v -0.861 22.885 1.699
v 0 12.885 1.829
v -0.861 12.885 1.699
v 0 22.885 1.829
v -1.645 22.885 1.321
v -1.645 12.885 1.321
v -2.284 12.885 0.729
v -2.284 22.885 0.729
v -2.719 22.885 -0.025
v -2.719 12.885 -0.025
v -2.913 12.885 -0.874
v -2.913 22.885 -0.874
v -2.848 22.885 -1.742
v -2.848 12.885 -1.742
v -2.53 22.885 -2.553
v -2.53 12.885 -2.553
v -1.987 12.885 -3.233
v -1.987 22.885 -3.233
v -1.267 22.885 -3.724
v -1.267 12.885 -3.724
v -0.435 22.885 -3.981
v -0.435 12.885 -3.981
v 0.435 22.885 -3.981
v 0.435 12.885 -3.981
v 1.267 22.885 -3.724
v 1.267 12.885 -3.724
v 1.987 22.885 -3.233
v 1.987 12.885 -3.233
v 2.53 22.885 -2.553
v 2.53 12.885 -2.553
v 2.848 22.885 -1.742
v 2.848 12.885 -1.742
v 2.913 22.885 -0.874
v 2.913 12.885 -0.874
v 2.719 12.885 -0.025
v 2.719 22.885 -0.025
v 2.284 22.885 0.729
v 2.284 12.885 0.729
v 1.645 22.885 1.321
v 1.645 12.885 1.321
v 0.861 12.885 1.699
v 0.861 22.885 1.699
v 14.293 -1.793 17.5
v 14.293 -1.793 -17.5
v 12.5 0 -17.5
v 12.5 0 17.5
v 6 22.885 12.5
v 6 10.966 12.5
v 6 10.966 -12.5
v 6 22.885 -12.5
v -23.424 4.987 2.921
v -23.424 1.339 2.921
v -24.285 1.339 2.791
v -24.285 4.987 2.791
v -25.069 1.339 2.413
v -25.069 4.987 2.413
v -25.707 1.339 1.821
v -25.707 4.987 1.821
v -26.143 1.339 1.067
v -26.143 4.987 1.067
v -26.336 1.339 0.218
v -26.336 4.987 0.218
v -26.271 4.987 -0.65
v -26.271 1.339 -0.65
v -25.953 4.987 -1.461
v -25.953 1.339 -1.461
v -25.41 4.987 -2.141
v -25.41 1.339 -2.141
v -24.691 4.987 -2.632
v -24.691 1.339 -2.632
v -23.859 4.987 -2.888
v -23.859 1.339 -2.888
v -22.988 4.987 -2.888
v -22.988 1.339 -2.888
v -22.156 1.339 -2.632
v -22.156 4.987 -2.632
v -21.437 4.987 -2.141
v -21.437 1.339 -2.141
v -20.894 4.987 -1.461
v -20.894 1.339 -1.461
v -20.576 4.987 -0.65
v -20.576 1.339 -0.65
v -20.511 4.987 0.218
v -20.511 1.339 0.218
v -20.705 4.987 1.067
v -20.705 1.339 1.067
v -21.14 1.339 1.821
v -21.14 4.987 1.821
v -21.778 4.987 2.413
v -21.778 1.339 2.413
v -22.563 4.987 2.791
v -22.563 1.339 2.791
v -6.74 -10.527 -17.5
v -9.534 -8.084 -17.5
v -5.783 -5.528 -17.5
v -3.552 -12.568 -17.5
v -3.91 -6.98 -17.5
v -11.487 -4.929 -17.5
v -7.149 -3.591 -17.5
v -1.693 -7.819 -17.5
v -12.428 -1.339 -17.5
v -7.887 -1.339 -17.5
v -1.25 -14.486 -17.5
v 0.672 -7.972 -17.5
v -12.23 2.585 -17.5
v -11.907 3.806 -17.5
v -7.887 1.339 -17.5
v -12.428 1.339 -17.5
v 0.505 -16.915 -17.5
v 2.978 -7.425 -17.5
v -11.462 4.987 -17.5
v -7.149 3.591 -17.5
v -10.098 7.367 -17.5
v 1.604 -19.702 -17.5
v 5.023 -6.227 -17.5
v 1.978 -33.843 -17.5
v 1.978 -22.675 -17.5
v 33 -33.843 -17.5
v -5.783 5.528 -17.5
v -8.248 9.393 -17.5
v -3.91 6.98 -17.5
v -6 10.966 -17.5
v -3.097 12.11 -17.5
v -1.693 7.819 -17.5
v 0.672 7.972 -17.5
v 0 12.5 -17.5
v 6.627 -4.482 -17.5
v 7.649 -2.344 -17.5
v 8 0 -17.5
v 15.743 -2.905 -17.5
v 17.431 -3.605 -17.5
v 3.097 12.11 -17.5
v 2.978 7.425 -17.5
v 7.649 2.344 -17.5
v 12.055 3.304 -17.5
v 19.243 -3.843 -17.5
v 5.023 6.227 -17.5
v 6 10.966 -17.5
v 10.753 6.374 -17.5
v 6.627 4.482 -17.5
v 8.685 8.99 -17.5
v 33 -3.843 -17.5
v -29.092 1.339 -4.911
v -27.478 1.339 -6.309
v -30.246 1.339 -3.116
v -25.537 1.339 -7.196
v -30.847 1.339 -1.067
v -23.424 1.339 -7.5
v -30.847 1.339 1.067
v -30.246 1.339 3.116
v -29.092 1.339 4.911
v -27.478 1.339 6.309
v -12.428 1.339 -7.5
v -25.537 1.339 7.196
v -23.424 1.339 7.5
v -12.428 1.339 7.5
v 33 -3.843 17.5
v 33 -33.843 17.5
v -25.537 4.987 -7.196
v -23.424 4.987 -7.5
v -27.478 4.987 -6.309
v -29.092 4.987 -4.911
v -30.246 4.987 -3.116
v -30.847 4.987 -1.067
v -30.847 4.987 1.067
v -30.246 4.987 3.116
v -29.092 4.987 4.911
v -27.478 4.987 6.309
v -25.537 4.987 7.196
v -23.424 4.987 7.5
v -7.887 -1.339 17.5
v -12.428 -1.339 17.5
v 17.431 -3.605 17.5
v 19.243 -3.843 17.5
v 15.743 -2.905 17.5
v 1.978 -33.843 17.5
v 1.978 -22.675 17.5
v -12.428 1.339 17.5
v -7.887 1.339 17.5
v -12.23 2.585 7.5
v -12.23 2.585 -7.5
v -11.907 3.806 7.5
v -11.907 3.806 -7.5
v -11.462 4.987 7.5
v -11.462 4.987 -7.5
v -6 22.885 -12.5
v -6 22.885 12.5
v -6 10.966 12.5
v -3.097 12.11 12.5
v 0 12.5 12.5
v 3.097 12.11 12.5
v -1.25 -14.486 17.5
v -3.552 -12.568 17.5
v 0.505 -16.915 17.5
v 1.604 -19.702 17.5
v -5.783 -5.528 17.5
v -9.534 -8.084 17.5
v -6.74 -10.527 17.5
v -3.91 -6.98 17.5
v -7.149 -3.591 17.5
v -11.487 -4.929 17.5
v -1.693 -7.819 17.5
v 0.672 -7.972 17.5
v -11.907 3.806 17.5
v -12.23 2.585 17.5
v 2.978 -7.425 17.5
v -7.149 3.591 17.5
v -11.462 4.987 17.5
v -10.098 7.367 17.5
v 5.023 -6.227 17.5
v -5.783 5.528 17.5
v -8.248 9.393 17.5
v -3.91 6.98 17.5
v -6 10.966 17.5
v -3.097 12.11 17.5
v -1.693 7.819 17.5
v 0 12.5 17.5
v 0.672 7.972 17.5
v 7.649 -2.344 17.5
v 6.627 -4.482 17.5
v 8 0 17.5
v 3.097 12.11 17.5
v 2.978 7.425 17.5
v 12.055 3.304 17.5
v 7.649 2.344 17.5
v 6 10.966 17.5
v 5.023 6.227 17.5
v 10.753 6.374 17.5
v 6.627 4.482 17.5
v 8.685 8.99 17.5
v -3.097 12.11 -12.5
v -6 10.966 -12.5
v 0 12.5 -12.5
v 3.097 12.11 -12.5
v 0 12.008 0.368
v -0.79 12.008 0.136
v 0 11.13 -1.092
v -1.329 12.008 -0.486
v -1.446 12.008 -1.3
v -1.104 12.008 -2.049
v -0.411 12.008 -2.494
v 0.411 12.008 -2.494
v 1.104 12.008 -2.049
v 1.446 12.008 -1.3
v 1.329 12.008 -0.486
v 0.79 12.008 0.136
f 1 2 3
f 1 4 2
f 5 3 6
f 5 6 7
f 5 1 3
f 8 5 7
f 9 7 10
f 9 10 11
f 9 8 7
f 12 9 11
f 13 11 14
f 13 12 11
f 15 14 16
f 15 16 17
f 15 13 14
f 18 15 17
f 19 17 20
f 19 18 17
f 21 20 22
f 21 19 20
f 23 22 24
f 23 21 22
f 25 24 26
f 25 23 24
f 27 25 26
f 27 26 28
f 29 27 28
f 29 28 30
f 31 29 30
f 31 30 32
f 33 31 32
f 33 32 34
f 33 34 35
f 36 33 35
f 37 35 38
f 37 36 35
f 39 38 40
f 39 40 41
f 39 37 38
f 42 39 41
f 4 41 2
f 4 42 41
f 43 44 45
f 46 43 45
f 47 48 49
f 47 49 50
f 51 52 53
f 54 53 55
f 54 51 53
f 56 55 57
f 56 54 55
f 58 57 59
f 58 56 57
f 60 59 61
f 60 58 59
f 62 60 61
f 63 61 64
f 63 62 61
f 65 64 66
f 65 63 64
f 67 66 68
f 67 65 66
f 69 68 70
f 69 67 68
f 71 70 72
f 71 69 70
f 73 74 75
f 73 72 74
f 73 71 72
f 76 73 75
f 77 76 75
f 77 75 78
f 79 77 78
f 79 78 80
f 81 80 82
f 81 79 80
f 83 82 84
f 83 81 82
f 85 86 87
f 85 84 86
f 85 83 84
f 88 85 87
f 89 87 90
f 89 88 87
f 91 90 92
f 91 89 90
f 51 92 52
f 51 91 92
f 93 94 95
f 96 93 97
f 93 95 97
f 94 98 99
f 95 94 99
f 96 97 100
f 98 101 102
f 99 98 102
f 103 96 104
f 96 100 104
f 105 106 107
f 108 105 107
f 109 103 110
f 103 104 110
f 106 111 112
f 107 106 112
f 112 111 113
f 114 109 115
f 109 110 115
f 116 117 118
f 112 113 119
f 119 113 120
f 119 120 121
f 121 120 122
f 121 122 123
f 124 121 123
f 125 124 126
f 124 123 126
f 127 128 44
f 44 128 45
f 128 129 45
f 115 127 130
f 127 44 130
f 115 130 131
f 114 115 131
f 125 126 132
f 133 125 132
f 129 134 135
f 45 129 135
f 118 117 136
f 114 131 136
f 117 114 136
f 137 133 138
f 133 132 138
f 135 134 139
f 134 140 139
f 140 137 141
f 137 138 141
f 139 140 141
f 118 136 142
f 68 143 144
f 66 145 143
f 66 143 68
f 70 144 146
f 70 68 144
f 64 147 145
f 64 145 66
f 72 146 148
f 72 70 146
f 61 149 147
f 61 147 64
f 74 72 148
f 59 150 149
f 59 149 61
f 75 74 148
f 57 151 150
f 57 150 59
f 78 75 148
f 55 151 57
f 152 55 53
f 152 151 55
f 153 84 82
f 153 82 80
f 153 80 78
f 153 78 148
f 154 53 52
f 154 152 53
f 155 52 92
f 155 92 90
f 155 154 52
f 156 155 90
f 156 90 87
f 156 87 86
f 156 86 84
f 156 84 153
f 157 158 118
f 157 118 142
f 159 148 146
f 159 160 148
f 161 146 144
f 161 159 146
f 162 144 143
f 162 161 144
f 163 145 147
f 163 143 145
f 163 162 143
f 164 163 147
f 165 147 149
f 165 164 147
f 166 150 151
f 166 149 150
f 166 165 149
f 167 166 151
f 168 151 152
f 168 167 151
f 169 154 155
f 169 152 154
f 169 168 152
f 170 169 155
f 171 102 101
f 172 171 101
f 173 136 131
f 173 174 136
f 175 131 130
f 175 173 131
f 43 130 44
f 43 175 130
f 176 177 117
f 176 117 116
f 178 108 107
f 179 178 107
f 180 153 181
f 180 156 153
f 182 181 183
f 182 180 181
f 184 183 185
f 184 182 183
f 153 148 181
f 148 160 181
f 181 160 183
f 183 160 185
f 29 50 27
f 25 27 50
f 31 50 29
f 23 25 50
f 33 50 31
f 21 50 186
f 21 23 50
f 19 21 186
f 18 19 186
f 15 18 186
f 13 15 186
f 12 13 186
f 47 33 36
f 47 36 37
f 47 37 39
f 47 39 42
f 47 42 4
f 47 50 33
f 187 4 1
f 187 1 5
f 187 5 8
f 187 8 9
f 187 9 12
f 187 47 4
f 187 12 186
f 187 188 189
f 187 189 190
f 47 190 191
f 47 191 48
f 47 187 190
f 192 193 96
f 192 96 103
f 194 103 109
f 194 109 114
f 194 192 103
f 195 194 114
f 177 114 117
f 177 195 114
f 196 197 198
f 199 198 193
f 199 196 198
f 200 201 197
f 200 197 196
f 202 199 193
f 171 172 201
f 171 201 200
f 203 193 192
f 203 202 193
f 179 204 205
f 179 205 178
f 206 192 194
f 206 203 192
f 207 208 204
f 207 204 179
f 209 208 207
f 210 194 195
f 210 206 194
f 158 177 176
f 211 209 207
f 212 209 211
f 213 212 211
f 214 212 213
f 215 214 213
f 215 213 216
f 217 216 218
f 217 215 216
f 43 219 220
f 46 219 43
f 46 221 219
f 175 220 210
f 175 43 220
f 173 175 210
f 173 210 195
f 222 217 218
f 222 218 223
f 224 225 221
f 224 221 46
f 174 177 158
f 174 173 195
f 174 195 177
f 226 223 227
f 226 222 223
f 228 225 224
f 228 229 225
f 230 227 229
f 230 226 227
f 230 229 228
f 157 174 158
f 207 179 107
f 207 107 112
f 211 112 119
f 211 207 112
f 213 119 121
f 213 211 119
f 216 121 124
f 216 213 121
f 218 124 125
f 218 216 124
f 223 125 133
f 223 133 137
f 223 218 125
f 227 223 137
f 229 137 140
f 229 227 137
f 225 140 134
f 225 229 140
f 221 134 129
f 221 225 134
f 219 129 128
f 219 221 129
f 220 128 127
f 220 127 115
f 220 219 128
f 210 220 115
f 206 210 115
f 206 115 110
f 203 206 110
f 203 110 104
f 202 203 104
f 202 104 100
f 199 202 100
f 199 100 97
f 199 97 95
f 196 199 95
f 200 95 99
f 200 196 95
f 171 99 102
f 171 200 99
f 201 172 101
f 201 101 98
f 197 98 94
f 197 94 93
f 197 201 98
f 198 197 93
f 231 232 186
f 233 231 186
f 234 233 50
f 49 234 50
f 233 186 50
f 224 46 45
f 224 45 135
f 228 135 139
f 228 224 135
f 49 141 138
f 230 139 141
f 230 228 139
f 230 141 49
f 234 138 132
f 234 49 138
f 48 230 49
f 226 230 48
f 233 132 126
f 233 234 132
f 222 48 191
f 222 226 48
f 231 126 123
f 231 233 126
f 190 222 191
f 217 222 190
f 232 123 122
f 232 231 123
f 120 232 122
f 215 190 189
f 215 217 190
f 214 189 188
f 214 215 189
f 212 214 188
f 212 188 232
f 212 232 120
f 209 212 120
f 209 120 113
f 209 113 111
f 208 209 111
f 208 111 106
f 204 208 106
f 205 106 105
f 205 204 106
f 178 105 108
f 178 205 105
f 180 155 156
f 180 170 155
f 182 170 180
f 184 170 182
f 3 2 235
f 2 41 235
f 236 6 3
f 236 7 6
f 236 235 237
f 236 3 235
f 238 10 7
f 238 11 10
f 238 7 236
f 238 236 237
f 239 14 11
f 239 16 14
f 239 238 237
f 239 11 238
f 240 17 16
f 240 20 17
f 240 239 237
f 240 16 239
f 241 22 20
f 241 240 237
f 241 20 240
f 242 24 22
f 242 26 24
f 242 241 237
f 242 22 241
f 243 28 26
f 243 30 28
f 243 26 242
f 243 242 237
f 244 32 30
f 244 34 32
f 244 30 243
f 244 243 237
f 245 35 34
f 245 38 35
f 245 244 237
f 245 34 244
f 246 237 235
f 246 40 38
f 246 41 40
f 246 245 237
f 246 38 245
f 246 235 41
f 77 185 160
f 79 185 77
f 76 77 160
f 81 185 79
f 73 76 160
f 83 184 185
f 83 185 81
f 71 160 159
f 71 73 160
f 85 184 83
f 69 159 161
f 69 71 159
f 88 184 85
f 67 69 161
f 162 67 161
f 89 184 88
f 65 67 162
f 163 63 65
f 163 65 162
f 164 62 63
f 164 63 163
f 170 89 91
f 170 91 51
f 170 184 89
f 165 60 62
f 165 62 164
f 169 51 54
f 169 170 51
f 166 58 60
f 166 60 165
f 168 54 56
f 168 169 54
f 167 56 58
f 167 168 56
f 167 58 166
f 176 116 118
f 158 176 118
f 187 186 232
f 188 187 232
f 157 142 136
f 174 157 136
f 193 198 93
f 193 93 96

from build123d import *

# Parameters (mm, degrees)
BOSS_EXTRUDE1_DEPTH = 17.5
BOSS_EXTRUDE2_DEPTH = 7.5
BOSS_EXTRUDE3_DEPTH = 12.5
FILLET1_RADIUS      = 7.5
FILLET1_LENGTH      = 3.648240144


with BuildPart() as part:
    # Sketch1 → Boss-Extrude1 (new, symmetric)
    with BuildSketch(Plane.XY):
        with BuildLine():
            Line((14.293050208, -1.793050208), (12.5, 0))
            ThreePointArc((12.5, 0), (10.752906584, 6.373774392), (6, 10.9658561))
            ThreePointArc((6, 10.9658561), (0, 12.5), (-6, 10.9658561))
            ThreePointArc((-6, 10.9658561), (-9.228622735, 8.431045156), (-11.462073834, 4.987069623))
            ThreePointArc((-11.462073834, 4.987069623), (-12.083561193, 3.199616992), (-12.42809461, 1.338829478))
            Line((-12.42809461, 1.338829478), (-7.88717539, 1.338829478))
            ThreePointArc((-7.88717539, 1.338829478), (0.671787497, 7.971743947), (8, 0))
            ThreePointArc((8, 0), (0.671787497, -7.971743947), (-7.88717539, -1.338829478))
            Line((-7.88717539, -1.338829478), (-12.42809461, -1.338829478))
            ThreePointArc((-12.42809461, -1.338829478), (-10.628292495, -6.57946796), (-6.74, -10.527221856))
            Line((-6.74, -10.527221856), (-3.551888901, -12.568393696))
            ThreePointArc((-3.551888901, -12.568393696), (0.504932954, -16.914526677), (1.977711099, -22.674526677))
            Line((1.977711099, -22.674526677), (1.977711099, -33.84330274))
            Line((1.977711099, -33.84330274), (33, -33.84330274))
            Line((33, -33.84330274), (33, -3.84330274))
            Line((33, -3.84330274), (19.242797676, -3.84330274))
            ThreePointArc((19.242797676, -3.84330274), (16.56401365, -3.310459467), (14.293050208, -1.793050208))
        make_face()
    extrude(amount=BOSS_EXTRUDE1_DEPTH, both=True)

    # Sketch1<5> → Boss-Extrude3 (add, symmetric)
    with BuildSketch(Plane.XY):
        with BuildLine():
            ThreePointArc((-6, 10.9658561), (0, 12.5), (6, 10.9658561))
            Line((6, 10.9658561), (6, 22.88520947))
            Line((6, 22.88520947), (-6, 22.88520947))
            Line((-6, 22.88520947), (-6, 10.9658561))
        make_face()
    extrude(amount=BOSS_EXTRUDE3_DEPTH, both=True)

    # Sketch9 → #97 (0.23) Diameter Hole1 (revolve, cut)
    with BuildSketch(Plane(origin=(0, 22.88520947, -1.092219925), x_dir=(0, 0, 1), z_dir=(1, 0, 0))):
        Polygon((0, 0), (0, 11.755113868), (2.921, 10), (2.921, 0), align=None)
    revolve(axis=Axis((0, 29.23520947, -1.092219925), (0, -1, 0)), mode=Mode.SUBTRACT)


with BuildPart() as body_2:
    # Sketch1<4> → Boss-Extrude2 (new, symmetric)
    with BuildSketch(Plane.XY):
        with BuildLine():
            ThreePointArc((-12.42809461, 1.338829478), (-12.083561193, 3.199616992), (-11.462073834, 4.987069623))
            Line((-11.462073834, 4.987069623), (-30.92366752, 4.987069623))
            Line((-30.92366752, 4.987069623), (-30.92366752, 1.338829478))
            Line((-30.92366752, 1.338829478), (-12.42809461, 1.338829478))
        make_face()
    extrude(amount=BOSS_EXTRUDE2_DEPTH, both=True)

    # Fillet1: full round fillet: the end face becomes a half cylinder, R = half its width
    fillet1_face = Plane((-30.92366752, 3.16294955, 0), x_dir=(0, 1, 0), z_dir=(-1, 0, 0))  # on the end face: x along it, z out of the body
    fillet1_slab = fillet1_face.offset(-FILLET1_RADIUS / 2) * Box(FILLET1_LENGTH, 2 * FILLET1_RADIUS, FILLET1_RADIUS, mode=Mode.PRIVATE)  # the body's end, R deep
    fillet1_round = Plane((-23.42366752, 3.16294955, 0), x_dir=(-1, 0, 0), z_dir=(0, 1, 0)) * Cylinder(FILLET1_RADIUS, FILLET1_LENGTH, mode=Mode.PRIVATE)  # its axis R under the face
    add(fillet1_slab - fillet1_round, mode=Mode.SUBTRACT)

    # Sketch3 → #75 (0.23) Diameter Hole1 (revolve, cut)
    with BuildSketch(Plane(origin=(-23.42366752, 4.987069623, 0), x_dir=(0, 0, 1), z_dir=(1, 0, 0))):
        Polygon((0, 0), (0, 21.755113868), (2.921, 20), (2.921, 0), align=None)
    revolve(axis=Axis((-23.42366752, 11.337069623, 0), (0, -1, 0)), mode=Mode.SUBTRACT)


solid = Compound([part.part, body_2.part])
